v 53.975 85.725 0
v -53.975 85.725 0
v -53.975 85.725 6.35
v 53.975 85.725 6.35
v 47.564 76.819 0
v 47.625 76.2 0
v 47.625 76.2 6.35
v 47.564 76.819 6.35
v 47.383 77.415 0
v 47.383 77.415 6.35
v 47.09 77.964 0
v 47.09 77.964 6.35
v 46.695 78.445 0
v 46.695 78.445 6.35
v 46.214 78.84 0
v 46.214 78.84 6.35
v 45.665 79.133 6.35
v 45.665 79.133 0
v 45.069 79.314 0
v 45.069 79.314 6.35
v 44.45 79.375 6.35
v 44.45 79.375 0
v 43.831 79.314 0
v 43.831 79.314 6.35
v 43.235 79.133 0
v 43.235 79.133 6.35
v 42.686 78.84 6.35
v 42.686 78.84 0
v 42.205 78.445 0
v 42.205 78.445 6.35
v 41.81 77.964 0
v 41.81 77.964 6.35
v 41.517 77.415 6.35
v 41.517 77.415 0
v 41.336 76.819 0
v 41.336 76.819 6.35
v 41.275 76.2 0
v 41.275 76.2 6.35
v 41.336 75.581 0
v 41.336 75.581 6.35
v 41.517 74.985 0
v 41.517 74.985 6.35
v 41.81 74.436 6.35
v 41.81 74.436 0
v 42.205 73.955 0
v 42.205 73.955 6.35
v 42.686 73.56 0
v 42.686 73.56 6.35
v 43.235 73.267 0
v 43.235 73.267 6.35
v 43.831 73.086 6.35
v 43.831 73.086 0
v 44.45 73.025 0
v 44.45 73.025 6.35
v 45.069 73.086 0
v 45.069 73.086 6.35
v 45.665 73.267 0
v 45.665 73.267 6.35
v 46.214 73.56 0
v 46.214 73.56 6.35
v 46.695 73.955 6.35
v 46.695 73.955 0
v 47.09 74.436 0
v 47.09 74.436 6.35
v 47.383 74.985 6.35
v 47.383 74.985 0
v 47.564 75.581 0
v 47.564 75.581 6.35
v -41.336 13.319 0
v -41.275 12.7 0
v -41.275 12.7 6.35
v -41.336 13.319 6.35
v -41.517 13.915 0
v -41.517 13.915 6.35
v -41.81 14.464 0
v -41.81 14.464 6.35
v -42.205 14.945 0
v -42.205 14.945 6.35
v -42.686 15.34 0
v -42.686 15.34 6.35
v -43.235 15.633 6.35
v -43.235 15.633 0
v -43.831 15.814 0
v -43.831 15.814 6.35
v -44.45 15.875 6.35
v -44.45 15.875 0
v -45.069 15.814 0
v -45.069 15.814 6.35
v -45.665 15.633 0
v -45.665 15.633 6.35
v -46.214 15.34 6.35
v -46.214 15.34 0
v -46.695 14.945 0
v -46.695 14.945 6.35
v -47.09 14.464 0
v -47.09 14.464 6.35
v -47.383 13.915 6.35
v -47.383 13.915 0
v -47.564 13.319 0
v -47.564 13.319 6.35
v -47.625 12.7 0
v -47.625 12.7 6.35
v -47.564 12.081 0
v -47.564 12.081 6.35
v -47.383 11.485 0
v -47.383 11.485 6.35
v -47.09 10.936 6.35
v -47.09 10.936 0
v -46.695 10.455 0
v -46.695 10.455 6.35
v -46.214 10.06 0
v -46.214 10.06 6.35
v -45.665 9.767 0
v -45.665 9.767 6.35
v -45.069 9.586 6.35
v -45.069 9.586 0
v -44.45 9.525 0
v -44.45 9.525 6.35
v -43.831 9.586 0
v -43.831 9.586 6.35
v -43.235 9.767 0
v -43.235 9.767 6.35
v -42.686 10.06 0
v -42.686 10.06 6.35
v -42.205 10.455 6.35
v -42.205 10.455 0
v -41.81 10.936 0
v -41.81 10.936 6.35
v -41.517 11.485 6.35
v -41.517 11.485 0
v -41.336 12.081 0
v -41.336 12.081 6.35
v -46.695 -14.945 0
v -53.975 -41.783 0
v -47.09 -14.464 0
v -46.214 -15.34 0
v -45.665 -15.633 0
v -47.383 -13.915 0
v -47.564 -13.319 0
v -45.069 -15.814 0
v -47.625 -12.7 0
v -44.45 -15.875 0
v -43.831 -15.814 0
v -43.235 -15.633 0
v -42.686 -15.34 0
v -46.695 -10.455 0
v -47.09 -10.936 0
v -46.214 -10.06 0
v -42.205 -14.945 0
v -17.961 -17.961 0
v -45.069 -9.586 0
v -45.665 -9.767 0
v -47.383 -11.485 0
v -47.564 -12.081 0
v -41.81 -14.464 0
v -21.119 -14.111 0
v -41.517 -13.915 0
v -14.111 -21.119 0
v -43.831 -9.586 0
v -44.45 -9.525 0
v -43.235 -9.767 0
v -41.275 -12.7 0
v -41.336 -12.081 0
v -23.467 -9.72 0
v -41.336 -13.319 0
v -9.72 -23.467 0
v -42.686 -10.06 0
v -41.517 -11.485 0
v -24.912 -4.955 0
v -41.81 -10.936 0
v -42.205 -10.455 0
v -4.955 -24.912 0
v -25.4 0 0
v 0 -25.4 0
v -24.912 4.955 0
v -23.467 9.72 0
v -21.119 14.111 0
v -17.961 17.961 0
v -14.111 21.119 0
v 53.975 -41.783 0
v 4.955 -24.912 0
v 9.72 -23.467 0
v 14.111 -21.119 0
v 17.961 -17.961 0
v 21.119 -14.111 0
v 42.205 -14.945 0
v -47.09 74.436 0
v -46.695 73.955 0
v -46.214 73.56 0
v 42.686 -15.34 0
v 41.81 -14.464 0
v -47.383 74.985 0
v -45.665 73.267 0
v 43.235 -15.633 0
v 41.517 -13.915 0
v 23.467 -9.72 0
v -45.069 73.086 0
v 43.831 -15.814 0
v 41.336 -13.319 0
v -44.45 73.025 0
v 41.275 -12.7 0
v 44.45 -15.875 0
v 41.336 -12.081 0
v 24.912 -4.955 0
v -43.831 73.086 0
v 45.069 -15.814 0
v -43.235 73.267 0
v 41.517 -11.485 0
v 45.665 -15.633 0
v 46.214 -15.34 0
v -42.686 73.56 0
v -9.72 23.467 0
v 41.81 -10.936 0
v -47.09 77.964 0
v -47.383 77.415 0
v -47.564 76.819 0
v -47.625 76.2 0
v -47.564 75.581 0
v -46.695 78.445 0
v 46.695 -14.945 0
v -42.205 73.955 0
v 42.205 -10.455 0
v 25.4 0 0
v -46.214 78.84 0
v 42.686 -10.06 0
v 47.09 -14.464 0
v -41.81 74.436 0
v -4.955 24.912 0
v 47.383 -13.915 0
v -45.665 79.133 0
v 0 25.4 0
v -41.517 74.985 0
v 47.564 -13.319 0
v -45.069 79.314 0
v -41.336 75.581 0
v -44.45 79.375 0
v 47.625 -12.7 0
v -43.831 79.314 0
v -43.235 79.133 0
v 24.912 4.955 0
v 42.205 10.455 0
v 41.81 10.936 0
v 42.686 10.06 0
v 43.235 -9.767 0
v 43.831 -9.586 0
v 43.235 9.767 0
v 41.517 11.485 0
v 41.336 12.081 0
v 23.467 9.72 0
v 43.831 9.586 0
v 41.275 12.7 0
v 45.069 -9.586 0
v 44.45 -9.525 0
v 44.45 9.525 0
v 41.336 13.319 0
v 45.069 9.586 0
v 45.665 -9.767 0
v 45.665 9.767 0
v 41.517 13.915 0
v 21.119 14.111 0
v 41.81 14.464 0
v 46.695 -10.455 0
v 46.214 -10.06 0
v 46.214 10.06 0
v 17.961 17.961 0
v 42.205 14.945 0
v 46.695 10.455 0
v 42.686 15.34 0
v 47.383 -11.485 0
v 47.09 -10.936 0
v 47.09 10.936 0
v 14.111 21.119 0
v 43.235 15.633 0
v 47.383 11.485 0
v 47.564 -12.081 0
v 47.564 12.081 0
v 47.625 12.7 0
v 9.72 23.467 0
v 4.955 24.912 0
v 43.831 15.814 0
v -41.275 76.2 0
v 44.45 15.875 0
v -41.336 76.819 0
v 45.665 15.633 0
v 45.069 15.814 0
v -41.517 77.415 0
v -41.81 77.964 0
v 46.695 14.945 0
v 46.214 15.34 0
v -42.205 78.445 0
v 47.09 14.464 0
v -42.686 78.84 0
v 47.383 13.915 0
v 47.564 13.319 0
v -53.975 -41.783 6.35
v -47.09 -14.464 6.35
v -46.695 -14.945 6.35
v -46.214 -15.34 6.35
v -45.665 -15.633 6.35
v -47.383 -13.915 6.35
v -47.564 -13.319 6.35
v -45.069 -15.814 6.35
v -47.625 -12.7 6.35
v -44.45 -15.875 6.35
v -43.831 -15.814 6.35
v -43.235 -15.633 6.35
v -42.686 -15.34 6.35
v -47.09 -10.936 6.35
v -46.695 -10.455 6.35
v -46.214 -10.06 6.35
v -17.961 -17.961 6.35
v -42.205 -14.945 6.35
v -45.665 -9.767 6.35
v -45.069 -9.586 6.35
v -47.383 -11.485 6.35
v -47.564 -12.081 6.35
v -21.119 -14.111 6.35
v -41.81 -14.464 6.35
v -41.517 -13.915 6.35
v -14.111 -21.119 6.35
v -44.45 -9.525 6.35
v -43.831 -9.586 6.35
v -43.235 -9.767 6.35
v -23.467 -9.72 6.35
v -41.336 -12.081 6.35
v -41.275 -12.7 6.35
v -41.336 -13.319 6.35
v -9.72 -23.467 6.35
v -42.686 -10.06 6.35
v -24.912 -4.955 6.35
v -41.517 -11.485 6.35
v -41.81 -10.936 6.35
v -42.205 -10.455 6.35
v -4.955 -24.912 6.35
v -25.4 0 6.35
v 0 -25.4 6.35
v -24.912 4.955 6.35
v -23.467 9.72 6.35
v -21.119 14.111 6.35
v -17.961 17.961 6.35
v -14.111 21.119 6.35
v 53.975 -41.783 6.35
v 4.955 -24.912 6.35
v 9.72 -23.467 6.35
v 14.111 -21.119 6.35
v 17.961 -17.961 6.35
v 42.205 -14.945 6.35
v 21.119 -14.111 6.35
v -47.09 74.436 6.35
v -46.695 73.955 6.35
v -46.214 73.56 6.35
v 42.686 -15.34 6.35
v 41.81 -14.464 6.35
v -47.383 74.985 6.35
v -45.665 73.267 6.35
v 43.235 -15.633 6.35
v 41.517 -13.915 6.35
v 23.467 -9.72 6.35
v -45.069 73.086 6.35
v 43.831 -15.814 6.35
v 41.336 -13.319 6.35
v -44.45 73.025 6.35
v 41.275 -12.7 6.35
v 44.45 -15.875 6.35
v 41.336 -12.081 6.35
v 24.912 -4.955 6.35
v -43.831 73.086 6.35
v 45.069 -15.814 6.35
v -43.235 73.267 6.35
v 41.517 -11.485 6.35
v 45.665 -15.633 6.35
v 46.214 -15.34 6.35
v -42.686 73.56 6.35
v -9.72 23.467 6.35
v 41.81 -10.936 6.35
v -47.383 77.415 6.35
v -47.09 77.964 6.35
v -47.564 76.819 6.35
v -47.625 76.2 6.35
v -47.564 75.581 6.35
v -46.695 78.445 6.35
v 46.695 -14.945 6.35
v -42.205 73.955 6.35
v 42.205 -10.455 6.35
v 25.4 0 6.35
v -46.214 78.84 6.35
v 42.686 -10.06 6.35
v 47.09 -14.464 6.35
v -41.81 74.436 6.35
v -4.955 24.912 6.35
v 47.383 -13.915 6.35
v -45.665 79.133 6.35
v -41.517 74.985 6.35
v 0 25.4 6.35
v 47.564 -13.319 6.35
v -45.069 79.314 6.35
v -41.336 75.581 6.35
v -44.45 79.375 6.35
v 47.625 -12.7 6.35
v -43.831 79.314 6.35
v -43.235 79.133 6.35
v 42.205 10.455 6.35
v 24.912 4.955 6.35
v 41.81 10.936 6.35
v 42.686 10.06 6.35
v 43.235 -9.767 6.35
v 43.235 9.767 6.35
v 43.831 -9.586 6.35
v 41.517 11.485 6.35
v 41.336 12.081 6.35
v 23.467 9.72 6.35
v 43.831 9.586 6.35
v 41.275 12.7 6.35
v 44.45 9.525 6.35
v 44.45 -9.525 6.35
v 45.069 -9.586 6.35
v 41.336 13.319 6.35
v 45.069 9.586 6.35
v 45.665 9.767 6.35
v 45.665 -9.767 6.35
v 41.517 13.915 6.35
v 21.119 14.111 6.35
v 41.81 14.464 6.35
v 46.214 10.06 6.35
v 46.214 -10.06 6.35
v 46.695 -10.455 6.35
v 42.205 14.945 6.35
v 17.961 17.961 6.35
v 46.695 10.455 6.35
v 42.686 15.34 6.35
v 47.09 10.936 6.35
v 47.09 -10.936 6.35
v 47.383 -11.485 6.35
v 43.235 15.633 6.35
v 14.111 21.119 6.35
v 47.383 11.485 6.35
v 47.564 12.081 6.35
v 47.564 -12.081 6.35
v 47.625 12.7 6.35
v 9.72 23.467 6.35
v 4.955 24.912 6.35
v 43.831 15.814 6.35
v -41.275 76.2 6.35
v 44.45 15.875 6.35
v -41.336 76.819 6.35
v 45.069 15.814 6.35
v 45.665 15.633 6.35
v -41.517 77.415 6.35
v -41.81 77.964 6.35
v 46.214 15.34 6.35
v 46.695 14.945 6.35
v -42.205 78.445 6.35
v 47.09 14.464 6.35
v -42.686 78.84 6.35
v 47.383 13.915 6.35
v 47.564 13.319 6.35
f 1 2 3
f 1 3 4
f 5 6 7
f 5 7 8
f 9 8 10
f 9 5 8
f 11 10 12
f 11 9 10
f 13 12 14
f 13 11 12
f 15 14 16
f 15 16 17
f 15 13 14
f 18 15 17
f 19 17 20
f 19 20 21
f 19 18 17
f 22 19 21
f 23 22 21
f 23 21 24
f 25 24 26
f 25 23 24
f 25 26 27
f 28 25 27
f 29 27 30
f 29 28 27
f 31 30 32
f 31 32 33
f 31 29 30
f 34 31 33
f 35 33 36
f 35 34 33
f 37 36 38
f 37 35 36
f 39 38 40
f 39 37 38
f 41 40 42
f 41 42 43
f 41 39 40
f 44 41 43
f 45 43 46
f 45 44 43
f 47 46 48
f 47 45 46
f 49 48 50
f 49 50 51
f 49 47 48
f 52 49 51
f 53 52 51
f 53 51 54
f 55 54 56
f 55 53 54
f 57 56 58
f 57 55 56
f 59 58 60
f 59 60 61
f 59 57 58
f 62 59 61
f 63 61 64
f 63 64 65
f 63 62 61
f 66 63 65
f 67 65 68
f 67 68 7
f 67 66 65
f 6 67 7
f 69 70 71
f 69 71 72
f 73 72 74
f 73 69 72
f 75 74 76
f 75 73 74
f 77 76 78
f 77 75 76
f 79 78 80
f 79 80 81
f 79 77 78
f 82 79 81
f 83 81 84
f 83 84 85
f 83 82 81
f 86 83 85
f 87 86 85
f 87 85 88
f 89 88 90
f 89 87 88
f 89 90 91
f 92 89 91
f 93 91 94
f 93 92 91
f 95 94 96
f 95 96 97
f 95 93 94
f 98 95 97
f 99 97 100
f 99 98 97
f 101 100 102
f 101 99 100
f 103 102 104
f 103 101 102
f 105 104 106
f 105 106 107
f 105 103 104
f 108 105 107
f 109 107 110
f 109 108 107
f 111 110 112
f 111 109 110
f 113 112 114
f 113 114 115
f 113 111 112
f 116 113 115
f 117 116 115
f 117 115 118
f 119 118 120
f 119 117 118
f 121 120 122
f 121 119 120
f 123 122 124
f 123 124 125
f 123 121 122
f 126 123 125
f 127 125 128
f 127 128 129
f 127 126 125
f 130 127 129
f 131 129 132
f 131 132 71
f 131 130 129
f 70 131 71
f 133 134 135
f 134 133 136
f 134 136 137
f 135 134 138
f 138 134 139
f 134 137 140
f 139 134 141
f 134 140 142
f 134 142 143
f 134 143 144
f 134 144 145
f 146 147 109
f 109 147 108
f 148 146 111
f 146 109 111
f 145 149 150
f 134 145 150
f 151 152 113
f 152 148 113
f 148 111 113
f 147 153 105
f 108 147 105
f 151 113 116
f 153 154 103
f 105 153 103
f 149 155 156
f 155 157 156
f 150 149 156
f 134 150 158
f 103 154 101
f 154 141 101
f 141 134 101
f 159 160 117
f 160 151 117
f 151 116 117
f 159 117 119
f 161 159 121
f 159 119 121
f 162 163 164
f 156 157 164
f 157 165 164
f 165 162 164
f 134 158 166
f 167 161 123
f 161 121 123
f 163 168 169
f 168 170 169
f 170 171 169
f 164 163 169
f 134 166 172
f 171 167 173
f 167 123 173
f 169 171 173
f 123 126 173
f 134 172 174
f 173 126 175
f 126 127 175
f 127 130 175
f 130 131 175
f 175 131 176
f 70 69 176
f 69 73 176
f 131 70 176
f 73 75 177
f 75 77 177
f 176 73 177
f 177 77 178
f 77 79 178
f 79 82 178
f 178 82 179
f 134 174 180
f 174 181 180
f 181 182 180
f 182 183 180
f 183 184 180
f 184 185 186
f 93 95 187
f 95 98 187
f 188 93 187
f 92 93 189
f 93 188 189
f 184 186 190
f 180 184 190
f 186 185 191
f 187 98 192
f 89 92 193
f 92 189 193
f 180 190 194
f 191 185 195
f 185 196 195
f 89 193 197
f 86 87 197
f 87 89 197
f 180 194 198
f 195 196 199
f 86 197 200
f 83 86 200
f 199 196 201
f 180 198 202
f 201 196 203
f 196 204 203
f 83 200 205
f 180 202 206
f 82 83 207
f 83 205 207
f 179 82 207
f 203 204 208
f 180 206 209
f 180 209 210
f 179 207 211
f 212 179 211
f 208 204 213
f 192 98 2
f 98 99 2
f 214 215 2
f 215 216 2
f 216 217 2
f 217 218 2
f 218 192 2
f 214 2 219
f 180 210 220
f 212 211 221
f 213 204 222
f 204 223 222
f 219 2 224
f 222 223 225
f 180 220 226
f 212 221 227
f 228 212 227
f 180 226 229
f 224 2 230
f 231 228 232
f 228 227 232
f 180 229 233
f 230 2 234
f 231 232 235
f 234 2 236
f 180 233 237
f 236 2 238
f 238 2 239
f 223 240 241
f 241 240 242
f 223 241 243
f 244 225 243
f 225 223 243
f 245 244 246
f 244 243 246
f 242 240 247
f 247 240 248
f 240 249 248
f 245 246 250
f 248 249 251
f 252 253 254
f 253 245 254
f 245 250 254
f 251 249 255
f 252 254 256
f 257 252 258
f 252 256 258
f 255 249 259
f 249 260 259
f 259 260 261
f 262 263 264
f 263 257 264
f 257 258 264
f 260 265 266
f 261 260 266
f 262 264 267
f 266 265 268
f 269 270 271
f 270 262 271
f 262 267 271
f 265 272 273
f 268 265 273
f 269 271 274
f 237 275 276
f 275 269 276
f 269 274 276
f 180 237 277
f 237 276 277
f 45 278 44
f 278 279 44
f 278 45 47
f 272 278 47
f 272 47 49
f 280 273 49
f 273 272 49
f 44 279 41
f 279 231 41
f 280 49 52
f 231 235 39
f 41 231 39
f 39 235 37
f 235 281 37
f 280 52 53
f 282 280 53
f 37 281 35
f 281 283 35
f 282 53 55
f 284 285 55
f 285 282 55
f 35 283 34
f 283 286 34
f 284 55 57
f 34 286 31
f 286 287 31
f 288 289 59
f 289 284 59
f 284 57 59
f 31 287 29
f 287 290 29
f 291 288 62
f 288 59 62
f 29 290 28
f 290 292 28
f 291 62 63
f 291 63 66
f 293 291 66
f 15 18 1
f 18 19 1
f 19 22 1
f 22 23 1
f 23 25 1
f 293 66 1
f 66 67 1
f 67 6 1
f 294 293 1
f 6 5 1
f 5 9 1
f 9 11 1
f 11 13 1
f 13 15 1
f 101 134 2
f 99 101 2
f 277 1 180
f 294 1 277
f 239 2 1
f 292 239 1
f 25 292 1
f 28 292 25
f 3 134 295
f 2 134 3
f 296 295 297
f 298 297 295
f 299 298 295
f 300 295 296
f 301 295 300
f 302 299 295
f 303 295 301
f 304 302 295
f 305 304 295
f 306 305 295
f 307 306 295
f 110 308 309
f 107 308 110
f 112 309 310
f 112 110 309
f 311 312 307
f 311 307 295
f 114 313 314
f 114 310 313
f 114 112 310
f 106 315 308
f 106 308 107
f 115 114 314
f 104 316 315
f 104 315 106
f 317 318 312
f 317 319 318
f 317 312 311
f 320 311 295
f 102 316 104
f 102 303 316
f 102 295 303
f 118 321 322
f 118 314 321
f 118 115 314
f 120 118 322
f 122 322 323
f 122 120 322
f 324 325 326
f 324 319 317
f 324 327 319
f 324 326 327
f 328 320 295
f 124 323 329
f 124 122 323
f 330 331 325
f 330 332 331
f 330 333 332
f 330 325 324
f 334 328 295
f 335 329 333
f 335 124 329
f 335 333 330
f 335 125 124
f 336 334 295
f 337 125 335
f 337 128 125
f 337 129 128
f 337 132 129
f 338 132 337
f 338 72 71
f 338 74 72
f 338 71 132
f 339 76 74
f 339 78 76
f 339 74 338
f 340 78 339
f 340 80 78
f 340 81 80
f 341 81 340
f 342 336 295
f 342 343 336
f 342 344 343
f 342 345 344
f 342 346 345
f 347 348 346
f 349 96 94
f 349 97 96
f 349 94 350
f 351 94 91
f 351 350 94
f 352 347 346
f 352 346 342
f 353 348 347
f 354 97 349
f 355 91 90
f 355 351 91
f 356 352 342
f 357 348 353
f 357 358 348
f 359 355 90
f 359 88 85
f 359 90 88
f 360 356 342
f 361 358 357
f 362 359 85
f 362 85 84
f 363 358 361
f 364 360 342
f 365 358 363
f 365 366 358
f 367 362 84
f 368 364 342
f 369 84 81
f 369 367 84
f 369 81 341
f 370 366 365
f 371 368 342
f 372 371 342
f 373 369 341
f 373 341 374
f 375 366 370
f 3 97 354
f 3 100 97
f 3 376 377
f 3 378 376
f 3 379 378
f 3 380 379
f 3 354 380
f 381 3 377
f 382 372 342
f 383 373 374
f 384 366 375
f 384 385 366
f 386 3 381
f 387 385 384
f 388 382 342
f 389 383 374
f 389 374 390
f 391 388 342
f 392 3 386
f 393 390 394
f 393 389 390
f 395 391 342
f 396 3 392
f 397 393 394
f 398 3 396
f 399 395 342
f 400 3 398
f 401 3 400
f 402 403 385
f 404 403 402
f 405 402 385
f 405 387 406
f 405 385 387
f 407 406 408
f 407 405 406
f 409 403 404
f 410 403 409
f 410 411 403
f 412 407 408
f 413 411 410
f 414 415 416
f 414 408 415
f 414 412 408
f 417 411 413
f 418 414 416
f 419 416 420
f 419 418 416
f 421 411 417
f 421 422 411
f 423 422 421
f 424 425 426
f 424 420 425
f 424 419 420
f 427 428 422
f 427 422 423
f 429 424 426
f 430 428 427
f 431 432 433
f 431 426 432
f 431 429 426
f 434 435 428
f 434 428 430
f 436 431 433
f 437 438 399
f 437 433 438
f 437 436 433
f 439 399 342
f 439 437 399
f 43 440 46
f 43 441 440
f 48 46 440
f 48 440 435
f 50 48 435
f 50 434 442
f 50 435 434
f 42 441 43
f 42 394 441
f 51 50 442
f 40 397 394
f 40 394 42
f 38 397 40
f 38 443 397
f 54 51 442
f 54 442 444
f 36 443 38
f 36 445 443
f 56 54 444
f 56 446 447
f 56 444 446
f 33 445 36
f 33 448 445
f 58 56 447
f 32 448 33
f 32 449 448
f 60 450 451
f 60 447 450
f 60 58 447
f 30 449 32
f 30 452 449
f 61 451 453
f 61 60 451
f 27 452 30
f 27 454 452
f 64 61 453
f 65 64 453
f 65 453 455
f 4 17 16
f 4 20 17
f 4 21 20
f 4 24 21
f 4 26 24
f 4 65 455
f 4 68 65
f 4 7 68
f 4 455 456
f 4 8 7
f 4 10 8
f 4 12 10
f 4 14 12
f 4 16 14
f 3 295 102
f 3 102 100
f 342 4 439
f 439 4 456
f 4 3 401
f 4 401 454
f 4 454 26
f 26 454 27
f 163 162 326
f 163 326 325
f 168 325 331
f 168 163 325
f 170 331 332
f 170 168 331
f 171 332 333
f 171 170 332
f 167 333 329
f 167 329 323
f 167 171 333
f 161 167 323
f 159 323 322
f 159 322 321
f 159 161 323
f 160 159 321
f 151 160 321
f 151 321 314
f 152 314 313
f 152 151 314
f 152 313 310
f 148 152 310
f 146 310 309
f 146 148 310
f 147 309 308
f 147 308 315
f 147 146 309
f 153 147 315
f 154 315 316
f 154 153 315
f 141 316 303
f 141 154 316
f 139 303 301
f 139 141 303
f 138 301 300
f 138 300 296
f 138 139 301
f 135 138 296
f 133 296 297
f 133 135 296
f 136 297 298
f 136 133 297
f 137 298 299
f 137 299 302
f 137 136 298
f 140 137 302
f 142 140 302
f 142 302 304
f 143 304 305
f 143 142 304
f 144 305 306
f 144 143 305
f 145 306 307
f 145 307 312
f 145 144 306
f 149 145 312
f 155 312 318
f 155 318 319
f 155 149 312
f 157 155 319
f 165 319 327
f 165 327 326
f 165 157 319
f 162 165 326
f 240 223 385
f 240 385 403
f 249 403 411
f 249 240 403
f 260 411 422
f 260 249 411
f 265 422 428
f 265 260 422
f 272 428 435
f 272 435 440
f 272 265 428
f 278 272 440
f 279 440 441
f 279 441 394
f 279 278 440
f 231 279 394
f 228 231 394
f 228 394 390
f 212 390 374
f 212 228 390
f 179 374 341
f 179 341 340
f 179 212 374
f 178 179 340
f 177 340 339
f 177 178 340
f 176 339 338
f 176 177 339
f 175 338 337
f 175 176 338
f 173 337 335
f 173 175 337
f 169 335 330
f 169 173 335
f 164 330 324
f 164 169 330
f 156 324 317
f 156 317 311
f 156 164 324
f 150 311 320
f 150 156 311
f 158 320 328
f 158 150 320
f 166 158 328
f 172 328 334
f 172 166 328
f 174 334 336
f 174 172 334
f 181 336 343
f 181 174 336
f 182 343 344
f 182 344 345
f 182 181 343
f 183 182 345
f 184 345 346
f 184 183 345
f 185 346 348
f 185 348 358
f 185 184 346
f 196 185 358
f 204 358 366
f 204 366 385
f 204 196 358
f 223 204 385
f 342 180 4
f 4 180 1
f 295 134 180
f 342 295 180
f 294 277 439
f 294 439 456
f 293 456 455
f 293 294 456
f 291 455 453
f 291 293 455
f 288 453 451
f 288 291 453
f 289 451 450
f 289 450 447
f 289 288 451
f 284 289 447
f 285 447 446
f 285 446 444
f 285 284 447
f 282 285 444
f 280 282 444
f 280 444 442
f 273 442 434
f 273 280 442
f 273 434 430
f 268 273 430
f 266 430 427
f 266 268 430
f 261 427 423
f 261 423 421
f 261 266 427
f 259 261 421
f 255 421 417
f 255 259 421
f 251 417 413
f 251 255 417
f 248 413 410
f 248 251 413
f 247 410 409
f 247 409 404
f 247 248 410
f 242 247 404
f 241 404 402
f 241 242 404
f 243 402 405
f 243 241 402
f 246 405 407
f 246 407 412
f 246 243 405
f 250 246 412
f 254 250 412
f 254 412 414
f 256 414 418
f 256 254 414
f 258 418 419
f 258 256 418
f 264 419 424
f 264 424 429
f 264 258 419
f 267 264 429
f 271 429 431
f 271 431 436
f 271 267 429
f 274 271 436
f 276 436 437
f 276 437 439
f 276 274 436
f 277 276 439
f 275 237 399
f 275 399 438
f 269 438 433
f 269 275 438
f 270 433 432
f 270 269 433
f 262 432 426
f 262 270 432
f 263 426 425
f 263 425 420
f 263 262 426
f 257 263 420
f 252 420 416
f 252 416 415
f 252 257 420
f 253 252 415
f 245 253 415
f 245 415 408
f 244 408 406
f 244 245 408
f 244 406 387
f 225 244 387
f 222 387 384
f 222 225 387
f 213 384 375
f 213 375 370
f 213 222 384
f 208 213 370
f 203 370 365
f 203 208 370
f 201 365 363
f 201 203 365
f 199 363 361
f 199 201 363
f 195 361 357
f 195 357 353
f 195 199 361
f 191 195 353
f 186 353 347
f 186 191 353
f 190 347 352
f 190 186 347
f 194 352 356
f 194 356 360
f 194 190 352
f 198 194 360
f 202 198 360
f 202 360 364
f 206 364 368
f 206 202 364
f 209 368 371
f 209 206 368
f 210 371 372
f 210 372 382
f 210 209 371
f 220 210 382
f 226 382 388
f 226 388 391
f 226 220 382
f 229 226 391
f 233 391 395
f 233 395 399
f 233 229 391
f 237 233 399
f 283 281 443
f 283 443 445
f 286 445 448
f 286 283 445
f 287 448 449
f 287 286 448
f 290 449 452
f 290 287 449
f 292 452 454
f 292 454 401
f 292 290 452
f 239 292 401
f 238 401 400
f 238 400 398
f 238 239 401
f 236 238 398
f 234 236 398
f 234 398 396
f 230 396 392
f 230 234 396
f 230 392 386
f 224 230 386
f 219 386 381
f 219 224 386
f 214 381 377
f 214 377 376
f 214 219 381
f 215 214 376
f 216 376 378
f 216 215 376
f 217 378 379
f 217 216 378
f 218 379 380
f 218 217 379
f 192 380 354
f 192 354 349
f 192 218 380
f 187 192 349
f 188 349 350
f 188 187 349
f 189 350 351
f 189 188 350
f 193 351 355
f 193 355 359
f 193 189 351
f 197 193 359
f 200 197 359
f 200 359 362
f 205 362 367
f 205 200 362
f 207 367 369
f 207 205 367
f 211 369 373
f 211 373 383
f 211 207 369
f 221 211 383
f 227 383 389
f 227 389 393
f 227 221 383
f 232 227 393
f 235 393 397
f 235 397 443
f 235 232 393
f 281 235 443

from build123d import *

# Parameters (mm, degrees)
SKETCH1_W           = 107.95
SKETCH1_H           = 127.508
SKETCH1_R           = 25.4
SKETCH1_R_2         = 3.175
BOSS_EXTRUDE1_DEPTH = 6.35


with BuildPart() as part:
    # Sketch1 → Boss-Extrude1 (new body)
    with BuildSketch(Plane.XY):
        with Locations((0, 21.971)):
            Rectangle(SKETCH1_W, SKETCH1_H)
        Circle(SKETCH1_R, mode=Mode.SUBTRACT)
        with Locations((-44.45, 76.2)):
            Circle(SKETCH1_R_2, mode=Mode.SUBTRACT)
        with Locations((44.45, 76.2)):
            Circle(SKETCH1_R_2, mode=Mode.SUBTRACT)
        with Locations((-44.45, 12.7)):
            Circle(SKETCH1_R_2, mode=Mode.SUBTRACT)
        with Locations((-44.45, -12.7)):
            Circle(SKETCH1_R_2, mode=Mode.SUBTRACT)
        with Locations((44.45, -12.7)):
            Circle(SKETCH1_R_2, mode=Mode.SUBTRACT)
        with Locations((44.45, 12.7)):
            Circle(SKETCH1_R_2, mode=Mode.SUBTRACT)
    extrude(amount=BOSS_EXTRUDE1_DEPTH)


solid = part.part
